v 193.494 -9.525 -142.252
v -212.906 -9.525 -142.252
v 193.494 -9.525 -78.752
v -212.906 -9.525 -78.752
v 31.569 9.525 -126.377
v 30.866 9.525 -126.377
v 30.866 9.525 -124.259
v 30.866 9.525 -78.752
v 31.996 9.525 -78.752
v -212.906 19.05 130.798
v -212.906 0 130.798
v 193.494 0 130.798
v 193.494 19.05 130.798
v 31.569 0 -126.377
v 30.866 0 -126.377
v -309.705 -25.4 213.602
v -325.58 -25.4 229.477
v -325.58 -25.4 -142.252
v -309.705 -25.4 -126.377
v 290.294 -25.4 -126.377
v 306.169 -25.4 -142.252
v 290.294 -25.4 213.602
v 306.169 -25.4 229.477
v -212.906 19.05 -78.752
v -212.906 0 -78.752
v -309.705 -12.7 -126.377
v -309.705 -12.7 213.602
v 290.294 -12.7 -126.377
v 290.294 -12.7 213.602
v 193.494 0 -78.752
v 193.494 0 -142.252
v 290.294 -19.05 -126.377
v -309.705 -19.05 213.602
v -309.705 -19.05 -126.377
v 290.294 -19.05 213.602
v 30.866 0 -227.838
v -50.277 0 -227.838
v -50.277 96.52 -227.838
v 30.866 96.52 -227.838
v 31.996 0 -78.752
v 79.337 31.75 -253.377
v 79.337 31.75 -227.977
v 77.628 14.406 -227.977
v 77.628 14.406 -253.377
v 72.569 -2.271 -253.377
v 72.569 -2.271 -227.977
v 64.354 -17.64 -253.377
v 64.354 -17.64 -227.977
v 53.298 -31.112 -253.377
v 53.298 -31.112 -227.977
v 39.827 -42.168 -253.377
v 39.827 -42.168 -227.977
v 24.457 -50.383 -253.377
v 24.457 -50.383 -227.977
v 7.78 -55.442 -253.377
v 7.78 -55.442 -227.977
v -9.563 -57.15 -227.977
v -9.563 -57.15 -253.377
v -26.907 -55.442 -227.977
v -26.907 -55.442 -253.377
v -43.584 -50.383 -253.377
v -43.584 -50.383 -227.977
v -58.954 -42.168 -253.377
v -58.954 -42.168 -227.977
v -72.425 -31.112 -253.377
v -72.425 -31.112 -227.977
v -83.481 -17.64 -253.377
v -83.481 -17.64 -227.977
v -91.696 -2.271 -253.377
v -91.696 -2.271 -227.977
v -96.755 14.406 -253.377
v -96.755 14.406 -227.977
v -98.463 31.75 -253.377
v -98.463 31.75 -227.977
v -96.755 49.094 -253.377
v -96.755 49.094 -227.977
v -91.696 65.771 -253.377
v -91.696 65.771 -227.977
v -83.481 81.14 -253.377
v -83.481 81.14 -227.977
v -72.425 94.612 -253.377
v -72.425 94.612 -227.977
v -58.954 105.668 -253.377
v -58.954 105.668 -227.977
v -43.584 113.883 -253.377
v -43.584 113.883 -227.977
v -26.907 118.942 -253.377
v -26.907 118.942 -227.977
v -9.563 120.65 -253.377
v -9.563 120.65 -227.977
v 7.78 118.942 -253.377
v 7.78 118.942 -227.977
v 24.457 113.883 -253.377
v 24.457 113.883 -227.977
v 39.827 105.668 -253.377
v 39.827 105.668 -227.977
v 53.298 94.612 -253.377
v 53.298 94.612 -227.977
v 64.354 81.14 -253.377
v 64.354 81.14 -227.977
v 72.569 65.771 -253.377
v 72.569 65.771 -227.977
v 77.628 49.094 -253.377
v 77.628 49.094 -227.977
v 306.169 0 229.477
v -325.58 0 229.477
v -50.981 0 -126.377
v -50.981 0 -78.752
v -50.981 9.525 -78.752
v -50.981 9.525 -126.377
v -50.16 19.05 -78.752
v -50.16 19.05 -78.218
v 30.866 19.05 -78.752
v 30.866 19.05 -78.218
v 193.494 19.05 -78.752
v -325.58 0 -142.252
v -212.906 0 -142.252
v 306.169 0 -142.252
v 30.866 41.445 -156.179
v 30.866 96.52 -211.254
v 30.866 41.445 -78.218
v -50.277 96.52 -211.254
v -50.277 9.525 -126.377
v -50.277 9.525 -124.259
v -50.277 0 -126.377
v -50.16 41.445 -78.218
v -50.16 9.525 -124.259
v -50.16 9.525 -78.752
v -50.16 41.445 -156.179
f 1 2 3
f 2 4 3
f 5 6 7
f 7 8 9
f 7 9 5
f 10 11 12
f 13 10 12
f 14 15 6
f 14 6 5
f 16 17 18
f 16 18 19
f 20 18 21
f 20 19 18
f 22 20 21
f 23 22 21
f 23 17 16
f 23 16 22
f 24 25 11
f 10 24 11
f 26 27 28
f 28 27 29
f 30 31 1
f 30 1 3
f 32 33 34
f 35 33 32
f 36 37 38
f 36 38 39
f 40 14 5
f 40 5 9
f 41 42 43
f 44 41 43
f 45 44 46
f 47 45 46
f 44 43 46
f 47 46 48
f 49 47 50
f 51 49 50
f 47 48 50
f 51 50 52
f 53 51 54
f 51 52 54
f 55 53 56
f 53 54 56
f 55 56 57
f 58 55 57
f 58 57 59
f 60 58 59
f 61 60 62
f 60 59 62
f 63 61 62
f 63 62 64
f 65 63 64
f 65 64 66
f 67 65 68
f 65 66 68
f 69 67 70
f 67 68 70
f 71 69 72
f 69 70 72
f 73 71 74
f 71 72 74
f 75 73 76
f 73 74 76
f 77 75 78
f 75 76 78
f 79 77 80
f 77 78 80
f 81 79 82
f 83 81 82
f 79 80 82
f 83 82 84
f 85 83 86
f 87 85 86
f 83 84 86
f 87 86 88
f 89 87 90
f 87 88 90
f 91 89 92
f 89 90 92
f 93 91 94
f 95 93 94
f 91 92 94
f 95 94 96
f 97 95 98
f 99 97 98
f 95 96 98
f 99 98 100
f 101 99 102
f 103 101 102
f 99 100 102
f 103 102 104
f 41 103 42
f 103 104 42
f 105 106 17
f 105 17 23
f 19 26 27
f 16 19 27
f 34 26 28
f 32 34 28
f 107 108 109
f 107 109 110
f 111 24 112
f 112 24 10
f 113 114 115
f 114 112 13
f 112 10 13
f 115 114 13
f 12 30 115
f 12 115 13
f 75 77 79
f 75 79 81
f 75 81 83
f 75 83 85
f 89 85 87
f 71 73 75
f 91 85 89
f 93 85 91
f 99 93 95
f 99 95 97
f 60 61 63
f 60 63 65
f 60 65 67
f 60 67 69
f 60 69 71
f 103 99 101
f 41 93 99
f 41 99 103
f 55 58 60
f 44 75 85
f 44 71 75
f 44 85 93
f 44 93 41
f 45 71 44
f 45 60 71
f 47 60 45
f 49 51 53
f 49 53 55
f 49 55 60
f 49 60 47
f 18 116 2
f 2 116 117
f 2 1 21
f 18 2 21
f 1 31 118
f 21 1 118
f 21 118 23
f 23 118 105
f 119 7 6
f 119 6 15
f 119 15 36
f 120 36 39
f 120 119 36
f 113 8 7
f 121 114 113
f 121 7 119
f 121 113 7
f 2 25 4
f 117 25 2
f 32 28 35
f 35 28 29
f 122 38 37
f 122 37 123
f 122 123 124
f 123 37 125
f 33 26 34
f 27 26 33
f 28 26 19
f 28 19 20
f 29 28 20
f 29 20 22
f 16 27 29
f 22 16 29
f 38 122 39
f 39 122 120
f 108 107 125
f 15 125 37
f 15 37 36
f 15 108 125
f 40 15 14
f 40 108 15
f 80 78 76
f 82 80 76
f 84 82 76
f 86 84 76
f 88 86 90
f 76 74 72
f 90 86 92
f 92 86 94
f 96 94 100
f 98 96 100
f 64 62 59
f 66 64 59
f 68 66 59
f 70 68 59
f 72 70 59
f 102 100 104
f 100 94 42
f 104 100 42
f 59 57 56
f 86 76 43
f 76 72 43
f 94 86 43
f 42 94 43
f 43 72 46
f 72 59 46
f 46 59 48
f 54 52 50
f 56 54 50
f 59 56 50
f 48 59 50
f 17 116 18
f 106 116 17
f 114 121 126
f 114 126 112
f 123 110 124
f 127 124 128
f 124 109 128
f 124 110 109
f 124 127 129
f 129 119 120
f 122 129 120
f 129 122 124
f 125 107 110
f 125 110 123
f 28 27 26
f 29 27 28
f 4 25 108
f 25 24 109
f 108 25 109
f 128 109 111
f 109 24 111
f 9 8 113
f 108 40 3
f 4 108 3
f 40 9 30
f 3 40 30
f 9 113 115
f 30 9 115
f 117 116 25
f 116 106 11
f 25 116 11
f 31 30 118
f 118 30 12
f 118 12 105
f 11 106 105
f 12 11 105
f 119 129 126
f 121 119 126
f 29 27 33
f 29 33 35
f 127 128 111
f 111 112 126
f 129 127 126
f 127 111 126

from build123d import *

# Parameters (mm, degrees)
F0_W         = 631.7488
F0_H         = 371.729
F0_W_2       = 599.9988
F0_H_2       = 339.979
F1_DEPTH     = 25.4
F2_DEPTH     = 12.7
F3_W         = 406.4
F3_H         = 209.55
F4_DEPTH     = 19.05
F5_W         = 406.4
F5_H         = 15.875
F5_H_2       = 47.625
F6_DEPTH     = 9.525
F8_DEPTH     = 9.525
F9_W         = 76.4845596125
F9_H         = 31.75
F10_DEPTH    = 44.45
F11_W        = 76.4845596125
F11_H        = 44.45
F12_DEPTH    = 101.6
F13_R        = 88.9
F14_DEPTH    = 25.4
F16_DEPTH    = 76.4845596125
F17_DEPTH    = 6.35
F18_W        = 81.1431687325
F18_H        = 148.663751781
F19_DEPTH    = 96.52
F20_T4_DEPTH = 760.4789468336
F22_DEPTH    = 81.026


# Not quite as in the source:
# - a fillet or chamfer that OpenCascade refuses, or shapes differently, is made with other operations: its cross-section is extruded or revolved along the edge and cut away or added
# - a feature names something its author has since deleted; it is built from what else it names


with BuildPart() as f1:
    # F0 (on Front) → F1 (new body)
    with BuildSketch(Plane.XZ):
        with Locations((-9.705722332, 43.6128355046)):
            Rectangle(F0_W, F0_H)
        with Locations((-9.705722332, 43.6128355046)):
            Rectangle(F0_W_2, F0_H_2, mode=Mode.SUBTRACT)
    extrude(amount=F1_DEPTH)

    # F0 (on Front) → F2 (join)
    with BuildSketch(Plane.XZ):
        with Locations((-9.705722332, 43.6128355046)):
            Rectangle(F0_W_2, F0_H_2)
    extrude(amount=F2_DEPTH)

    # F3 (on face) → F4 (join)
    with BuildSketch(Plane.XZ):
        with Locations((-9.705722332, 26.0233355046)):
            Rectangle(F3_W, F3_H)
    extrude(amount=-F4_DEPTH)

    # F5 (on face) → F6 (cut)
    with BuildSketch(Plane.XZ):
        with Locations((-9.705722332, -134.3141644954)):
            Rectangle(F5_W, F5_H)
        with Locations((-9.705722332, -102.5641644954)):
            Rectangle(F5_W, F5_H_2)
    extrude(amount=F6_DEPTH, mode=Mode.SUBTRACT)

    # F7 (on face) → F8 (join)
    with BuildSketch(Plane.XZ):
        Polygon((-50.980722332, -126.3766644954), (31.569277668, -126.3766644954), (31.9963085321, -78.7516644954), (31.569277668, -78.7516644954), (-50.980722332, -78.7516644954), align=None)
    extrude(amount=-F8_DEPTH)

    # F9 (on face) → F10 (join)
    with BuildSketch(Plane(origin=(0, 9.525, 0), x_dir=(-1, 0, 0), z_dir=(0, 1, 0))):
        with Locations((9.5634425258, -110.5016644954)):
            Rectangle(F9_W, F9_H)
    extrude(amount=F10_DEPTH)

    # F11 (on face) → F12 (join)
    with BuildSketch(Plane(origin=(0, 0, -126.3766644954), x_dir=(1, 0, 0), z_dir=(0, 0, -1))):
        with Locations((-9.5634425258, -31.75)):
            Rectangle(F11_W, F11_H)
    extrude(amount=F12_DEPTH)

    # F15 (on face) → F16 (cut, through all)
    with BuildSketch(Plane(origin=(-47.805722332, 0, 0), x_dir=(0, -1, 0), z_dir=(-1, 0, 0))):
        Polygon((-9.525, -126.3766644954), (-9.525, -94.6266644954), (-53.975, -94.6266644954), (-53.975, -227.9766644954), (-9.525, -227.9766644954), align=None)
    extrude(amount=-F16_DEPTH, mode=Mode.SUBTRACT)


with BuildPart() as f14:
    # F13 (on face) → F14 (new body)
    with BuildSketch(Plane(origin=(0, 0, -227.9766644954), x_dir=(1, 0, 0), z_dir=(0, 0, -1))):
        with Locations((-9.5634425258, -31.75)):
            Circle(F13_R)
    extrude(amount=F14_DEPTH)


with BuildPart() as f17:
    # F17 (new): a face of the model
    f17_faces = [f1.part.faces().sort_by_distance(p)[0] for p in [
        (-9.705722332, -12.7, 43.6128355046),
    ]]
    extrude(f17_faces, amount=F17_DEPTH)


with BuildPart() as f1_1:
    add(f1.part)

    # F18 (on Front) → F19 (join)
    with BuildSketch(Plane.XZ):
        with Locations((-9.7057269886, -153.5059846938)):
            Rectangle(F18_W, F18_H)
    extrude(amount=-F19_DEPTH)

    # F20: chamfer of 132.08 on 1 edges, made by hand


with BuildPart() as f20_tool2:
    # F20_s3 → F20_t4 (new body)
    with BuildSketch(Plane.YZ.offset(370.5337464282)):
        Polygon((-35.56, -79.1741088033), (96.52, -211.2541088033), (96.52, -79.1741088033), align=None)
    extrude(amount=-F20_T4_DEPTH)

    split(bisect_by=Plane.XZ.offset(-9.525), keep=Keep.BOTTOM)


with BuildPart() as f1_2:
    add(f1_1.part)

    # F20_t1: cut F20_tool2
    add(f20_tool2.part, mode=Mode.SUBTRACT)

    # F21 (on face) → F22 (join)
    with BuildSketch(Plane.YZ.offset(30.8658573776)):
        Polygon((41.4450243115, -78.2184153795), (0, -78.2184153795), (0, -126.3766644954), (9.525, -126.3766644954), (9.525, -124.2591088033), (41.4450243115, -156.1791331148), align=None)
    extrude(amount=-F22_DEPTH)


solid = Compound([f14.part, f17.part, f1_2.part])
